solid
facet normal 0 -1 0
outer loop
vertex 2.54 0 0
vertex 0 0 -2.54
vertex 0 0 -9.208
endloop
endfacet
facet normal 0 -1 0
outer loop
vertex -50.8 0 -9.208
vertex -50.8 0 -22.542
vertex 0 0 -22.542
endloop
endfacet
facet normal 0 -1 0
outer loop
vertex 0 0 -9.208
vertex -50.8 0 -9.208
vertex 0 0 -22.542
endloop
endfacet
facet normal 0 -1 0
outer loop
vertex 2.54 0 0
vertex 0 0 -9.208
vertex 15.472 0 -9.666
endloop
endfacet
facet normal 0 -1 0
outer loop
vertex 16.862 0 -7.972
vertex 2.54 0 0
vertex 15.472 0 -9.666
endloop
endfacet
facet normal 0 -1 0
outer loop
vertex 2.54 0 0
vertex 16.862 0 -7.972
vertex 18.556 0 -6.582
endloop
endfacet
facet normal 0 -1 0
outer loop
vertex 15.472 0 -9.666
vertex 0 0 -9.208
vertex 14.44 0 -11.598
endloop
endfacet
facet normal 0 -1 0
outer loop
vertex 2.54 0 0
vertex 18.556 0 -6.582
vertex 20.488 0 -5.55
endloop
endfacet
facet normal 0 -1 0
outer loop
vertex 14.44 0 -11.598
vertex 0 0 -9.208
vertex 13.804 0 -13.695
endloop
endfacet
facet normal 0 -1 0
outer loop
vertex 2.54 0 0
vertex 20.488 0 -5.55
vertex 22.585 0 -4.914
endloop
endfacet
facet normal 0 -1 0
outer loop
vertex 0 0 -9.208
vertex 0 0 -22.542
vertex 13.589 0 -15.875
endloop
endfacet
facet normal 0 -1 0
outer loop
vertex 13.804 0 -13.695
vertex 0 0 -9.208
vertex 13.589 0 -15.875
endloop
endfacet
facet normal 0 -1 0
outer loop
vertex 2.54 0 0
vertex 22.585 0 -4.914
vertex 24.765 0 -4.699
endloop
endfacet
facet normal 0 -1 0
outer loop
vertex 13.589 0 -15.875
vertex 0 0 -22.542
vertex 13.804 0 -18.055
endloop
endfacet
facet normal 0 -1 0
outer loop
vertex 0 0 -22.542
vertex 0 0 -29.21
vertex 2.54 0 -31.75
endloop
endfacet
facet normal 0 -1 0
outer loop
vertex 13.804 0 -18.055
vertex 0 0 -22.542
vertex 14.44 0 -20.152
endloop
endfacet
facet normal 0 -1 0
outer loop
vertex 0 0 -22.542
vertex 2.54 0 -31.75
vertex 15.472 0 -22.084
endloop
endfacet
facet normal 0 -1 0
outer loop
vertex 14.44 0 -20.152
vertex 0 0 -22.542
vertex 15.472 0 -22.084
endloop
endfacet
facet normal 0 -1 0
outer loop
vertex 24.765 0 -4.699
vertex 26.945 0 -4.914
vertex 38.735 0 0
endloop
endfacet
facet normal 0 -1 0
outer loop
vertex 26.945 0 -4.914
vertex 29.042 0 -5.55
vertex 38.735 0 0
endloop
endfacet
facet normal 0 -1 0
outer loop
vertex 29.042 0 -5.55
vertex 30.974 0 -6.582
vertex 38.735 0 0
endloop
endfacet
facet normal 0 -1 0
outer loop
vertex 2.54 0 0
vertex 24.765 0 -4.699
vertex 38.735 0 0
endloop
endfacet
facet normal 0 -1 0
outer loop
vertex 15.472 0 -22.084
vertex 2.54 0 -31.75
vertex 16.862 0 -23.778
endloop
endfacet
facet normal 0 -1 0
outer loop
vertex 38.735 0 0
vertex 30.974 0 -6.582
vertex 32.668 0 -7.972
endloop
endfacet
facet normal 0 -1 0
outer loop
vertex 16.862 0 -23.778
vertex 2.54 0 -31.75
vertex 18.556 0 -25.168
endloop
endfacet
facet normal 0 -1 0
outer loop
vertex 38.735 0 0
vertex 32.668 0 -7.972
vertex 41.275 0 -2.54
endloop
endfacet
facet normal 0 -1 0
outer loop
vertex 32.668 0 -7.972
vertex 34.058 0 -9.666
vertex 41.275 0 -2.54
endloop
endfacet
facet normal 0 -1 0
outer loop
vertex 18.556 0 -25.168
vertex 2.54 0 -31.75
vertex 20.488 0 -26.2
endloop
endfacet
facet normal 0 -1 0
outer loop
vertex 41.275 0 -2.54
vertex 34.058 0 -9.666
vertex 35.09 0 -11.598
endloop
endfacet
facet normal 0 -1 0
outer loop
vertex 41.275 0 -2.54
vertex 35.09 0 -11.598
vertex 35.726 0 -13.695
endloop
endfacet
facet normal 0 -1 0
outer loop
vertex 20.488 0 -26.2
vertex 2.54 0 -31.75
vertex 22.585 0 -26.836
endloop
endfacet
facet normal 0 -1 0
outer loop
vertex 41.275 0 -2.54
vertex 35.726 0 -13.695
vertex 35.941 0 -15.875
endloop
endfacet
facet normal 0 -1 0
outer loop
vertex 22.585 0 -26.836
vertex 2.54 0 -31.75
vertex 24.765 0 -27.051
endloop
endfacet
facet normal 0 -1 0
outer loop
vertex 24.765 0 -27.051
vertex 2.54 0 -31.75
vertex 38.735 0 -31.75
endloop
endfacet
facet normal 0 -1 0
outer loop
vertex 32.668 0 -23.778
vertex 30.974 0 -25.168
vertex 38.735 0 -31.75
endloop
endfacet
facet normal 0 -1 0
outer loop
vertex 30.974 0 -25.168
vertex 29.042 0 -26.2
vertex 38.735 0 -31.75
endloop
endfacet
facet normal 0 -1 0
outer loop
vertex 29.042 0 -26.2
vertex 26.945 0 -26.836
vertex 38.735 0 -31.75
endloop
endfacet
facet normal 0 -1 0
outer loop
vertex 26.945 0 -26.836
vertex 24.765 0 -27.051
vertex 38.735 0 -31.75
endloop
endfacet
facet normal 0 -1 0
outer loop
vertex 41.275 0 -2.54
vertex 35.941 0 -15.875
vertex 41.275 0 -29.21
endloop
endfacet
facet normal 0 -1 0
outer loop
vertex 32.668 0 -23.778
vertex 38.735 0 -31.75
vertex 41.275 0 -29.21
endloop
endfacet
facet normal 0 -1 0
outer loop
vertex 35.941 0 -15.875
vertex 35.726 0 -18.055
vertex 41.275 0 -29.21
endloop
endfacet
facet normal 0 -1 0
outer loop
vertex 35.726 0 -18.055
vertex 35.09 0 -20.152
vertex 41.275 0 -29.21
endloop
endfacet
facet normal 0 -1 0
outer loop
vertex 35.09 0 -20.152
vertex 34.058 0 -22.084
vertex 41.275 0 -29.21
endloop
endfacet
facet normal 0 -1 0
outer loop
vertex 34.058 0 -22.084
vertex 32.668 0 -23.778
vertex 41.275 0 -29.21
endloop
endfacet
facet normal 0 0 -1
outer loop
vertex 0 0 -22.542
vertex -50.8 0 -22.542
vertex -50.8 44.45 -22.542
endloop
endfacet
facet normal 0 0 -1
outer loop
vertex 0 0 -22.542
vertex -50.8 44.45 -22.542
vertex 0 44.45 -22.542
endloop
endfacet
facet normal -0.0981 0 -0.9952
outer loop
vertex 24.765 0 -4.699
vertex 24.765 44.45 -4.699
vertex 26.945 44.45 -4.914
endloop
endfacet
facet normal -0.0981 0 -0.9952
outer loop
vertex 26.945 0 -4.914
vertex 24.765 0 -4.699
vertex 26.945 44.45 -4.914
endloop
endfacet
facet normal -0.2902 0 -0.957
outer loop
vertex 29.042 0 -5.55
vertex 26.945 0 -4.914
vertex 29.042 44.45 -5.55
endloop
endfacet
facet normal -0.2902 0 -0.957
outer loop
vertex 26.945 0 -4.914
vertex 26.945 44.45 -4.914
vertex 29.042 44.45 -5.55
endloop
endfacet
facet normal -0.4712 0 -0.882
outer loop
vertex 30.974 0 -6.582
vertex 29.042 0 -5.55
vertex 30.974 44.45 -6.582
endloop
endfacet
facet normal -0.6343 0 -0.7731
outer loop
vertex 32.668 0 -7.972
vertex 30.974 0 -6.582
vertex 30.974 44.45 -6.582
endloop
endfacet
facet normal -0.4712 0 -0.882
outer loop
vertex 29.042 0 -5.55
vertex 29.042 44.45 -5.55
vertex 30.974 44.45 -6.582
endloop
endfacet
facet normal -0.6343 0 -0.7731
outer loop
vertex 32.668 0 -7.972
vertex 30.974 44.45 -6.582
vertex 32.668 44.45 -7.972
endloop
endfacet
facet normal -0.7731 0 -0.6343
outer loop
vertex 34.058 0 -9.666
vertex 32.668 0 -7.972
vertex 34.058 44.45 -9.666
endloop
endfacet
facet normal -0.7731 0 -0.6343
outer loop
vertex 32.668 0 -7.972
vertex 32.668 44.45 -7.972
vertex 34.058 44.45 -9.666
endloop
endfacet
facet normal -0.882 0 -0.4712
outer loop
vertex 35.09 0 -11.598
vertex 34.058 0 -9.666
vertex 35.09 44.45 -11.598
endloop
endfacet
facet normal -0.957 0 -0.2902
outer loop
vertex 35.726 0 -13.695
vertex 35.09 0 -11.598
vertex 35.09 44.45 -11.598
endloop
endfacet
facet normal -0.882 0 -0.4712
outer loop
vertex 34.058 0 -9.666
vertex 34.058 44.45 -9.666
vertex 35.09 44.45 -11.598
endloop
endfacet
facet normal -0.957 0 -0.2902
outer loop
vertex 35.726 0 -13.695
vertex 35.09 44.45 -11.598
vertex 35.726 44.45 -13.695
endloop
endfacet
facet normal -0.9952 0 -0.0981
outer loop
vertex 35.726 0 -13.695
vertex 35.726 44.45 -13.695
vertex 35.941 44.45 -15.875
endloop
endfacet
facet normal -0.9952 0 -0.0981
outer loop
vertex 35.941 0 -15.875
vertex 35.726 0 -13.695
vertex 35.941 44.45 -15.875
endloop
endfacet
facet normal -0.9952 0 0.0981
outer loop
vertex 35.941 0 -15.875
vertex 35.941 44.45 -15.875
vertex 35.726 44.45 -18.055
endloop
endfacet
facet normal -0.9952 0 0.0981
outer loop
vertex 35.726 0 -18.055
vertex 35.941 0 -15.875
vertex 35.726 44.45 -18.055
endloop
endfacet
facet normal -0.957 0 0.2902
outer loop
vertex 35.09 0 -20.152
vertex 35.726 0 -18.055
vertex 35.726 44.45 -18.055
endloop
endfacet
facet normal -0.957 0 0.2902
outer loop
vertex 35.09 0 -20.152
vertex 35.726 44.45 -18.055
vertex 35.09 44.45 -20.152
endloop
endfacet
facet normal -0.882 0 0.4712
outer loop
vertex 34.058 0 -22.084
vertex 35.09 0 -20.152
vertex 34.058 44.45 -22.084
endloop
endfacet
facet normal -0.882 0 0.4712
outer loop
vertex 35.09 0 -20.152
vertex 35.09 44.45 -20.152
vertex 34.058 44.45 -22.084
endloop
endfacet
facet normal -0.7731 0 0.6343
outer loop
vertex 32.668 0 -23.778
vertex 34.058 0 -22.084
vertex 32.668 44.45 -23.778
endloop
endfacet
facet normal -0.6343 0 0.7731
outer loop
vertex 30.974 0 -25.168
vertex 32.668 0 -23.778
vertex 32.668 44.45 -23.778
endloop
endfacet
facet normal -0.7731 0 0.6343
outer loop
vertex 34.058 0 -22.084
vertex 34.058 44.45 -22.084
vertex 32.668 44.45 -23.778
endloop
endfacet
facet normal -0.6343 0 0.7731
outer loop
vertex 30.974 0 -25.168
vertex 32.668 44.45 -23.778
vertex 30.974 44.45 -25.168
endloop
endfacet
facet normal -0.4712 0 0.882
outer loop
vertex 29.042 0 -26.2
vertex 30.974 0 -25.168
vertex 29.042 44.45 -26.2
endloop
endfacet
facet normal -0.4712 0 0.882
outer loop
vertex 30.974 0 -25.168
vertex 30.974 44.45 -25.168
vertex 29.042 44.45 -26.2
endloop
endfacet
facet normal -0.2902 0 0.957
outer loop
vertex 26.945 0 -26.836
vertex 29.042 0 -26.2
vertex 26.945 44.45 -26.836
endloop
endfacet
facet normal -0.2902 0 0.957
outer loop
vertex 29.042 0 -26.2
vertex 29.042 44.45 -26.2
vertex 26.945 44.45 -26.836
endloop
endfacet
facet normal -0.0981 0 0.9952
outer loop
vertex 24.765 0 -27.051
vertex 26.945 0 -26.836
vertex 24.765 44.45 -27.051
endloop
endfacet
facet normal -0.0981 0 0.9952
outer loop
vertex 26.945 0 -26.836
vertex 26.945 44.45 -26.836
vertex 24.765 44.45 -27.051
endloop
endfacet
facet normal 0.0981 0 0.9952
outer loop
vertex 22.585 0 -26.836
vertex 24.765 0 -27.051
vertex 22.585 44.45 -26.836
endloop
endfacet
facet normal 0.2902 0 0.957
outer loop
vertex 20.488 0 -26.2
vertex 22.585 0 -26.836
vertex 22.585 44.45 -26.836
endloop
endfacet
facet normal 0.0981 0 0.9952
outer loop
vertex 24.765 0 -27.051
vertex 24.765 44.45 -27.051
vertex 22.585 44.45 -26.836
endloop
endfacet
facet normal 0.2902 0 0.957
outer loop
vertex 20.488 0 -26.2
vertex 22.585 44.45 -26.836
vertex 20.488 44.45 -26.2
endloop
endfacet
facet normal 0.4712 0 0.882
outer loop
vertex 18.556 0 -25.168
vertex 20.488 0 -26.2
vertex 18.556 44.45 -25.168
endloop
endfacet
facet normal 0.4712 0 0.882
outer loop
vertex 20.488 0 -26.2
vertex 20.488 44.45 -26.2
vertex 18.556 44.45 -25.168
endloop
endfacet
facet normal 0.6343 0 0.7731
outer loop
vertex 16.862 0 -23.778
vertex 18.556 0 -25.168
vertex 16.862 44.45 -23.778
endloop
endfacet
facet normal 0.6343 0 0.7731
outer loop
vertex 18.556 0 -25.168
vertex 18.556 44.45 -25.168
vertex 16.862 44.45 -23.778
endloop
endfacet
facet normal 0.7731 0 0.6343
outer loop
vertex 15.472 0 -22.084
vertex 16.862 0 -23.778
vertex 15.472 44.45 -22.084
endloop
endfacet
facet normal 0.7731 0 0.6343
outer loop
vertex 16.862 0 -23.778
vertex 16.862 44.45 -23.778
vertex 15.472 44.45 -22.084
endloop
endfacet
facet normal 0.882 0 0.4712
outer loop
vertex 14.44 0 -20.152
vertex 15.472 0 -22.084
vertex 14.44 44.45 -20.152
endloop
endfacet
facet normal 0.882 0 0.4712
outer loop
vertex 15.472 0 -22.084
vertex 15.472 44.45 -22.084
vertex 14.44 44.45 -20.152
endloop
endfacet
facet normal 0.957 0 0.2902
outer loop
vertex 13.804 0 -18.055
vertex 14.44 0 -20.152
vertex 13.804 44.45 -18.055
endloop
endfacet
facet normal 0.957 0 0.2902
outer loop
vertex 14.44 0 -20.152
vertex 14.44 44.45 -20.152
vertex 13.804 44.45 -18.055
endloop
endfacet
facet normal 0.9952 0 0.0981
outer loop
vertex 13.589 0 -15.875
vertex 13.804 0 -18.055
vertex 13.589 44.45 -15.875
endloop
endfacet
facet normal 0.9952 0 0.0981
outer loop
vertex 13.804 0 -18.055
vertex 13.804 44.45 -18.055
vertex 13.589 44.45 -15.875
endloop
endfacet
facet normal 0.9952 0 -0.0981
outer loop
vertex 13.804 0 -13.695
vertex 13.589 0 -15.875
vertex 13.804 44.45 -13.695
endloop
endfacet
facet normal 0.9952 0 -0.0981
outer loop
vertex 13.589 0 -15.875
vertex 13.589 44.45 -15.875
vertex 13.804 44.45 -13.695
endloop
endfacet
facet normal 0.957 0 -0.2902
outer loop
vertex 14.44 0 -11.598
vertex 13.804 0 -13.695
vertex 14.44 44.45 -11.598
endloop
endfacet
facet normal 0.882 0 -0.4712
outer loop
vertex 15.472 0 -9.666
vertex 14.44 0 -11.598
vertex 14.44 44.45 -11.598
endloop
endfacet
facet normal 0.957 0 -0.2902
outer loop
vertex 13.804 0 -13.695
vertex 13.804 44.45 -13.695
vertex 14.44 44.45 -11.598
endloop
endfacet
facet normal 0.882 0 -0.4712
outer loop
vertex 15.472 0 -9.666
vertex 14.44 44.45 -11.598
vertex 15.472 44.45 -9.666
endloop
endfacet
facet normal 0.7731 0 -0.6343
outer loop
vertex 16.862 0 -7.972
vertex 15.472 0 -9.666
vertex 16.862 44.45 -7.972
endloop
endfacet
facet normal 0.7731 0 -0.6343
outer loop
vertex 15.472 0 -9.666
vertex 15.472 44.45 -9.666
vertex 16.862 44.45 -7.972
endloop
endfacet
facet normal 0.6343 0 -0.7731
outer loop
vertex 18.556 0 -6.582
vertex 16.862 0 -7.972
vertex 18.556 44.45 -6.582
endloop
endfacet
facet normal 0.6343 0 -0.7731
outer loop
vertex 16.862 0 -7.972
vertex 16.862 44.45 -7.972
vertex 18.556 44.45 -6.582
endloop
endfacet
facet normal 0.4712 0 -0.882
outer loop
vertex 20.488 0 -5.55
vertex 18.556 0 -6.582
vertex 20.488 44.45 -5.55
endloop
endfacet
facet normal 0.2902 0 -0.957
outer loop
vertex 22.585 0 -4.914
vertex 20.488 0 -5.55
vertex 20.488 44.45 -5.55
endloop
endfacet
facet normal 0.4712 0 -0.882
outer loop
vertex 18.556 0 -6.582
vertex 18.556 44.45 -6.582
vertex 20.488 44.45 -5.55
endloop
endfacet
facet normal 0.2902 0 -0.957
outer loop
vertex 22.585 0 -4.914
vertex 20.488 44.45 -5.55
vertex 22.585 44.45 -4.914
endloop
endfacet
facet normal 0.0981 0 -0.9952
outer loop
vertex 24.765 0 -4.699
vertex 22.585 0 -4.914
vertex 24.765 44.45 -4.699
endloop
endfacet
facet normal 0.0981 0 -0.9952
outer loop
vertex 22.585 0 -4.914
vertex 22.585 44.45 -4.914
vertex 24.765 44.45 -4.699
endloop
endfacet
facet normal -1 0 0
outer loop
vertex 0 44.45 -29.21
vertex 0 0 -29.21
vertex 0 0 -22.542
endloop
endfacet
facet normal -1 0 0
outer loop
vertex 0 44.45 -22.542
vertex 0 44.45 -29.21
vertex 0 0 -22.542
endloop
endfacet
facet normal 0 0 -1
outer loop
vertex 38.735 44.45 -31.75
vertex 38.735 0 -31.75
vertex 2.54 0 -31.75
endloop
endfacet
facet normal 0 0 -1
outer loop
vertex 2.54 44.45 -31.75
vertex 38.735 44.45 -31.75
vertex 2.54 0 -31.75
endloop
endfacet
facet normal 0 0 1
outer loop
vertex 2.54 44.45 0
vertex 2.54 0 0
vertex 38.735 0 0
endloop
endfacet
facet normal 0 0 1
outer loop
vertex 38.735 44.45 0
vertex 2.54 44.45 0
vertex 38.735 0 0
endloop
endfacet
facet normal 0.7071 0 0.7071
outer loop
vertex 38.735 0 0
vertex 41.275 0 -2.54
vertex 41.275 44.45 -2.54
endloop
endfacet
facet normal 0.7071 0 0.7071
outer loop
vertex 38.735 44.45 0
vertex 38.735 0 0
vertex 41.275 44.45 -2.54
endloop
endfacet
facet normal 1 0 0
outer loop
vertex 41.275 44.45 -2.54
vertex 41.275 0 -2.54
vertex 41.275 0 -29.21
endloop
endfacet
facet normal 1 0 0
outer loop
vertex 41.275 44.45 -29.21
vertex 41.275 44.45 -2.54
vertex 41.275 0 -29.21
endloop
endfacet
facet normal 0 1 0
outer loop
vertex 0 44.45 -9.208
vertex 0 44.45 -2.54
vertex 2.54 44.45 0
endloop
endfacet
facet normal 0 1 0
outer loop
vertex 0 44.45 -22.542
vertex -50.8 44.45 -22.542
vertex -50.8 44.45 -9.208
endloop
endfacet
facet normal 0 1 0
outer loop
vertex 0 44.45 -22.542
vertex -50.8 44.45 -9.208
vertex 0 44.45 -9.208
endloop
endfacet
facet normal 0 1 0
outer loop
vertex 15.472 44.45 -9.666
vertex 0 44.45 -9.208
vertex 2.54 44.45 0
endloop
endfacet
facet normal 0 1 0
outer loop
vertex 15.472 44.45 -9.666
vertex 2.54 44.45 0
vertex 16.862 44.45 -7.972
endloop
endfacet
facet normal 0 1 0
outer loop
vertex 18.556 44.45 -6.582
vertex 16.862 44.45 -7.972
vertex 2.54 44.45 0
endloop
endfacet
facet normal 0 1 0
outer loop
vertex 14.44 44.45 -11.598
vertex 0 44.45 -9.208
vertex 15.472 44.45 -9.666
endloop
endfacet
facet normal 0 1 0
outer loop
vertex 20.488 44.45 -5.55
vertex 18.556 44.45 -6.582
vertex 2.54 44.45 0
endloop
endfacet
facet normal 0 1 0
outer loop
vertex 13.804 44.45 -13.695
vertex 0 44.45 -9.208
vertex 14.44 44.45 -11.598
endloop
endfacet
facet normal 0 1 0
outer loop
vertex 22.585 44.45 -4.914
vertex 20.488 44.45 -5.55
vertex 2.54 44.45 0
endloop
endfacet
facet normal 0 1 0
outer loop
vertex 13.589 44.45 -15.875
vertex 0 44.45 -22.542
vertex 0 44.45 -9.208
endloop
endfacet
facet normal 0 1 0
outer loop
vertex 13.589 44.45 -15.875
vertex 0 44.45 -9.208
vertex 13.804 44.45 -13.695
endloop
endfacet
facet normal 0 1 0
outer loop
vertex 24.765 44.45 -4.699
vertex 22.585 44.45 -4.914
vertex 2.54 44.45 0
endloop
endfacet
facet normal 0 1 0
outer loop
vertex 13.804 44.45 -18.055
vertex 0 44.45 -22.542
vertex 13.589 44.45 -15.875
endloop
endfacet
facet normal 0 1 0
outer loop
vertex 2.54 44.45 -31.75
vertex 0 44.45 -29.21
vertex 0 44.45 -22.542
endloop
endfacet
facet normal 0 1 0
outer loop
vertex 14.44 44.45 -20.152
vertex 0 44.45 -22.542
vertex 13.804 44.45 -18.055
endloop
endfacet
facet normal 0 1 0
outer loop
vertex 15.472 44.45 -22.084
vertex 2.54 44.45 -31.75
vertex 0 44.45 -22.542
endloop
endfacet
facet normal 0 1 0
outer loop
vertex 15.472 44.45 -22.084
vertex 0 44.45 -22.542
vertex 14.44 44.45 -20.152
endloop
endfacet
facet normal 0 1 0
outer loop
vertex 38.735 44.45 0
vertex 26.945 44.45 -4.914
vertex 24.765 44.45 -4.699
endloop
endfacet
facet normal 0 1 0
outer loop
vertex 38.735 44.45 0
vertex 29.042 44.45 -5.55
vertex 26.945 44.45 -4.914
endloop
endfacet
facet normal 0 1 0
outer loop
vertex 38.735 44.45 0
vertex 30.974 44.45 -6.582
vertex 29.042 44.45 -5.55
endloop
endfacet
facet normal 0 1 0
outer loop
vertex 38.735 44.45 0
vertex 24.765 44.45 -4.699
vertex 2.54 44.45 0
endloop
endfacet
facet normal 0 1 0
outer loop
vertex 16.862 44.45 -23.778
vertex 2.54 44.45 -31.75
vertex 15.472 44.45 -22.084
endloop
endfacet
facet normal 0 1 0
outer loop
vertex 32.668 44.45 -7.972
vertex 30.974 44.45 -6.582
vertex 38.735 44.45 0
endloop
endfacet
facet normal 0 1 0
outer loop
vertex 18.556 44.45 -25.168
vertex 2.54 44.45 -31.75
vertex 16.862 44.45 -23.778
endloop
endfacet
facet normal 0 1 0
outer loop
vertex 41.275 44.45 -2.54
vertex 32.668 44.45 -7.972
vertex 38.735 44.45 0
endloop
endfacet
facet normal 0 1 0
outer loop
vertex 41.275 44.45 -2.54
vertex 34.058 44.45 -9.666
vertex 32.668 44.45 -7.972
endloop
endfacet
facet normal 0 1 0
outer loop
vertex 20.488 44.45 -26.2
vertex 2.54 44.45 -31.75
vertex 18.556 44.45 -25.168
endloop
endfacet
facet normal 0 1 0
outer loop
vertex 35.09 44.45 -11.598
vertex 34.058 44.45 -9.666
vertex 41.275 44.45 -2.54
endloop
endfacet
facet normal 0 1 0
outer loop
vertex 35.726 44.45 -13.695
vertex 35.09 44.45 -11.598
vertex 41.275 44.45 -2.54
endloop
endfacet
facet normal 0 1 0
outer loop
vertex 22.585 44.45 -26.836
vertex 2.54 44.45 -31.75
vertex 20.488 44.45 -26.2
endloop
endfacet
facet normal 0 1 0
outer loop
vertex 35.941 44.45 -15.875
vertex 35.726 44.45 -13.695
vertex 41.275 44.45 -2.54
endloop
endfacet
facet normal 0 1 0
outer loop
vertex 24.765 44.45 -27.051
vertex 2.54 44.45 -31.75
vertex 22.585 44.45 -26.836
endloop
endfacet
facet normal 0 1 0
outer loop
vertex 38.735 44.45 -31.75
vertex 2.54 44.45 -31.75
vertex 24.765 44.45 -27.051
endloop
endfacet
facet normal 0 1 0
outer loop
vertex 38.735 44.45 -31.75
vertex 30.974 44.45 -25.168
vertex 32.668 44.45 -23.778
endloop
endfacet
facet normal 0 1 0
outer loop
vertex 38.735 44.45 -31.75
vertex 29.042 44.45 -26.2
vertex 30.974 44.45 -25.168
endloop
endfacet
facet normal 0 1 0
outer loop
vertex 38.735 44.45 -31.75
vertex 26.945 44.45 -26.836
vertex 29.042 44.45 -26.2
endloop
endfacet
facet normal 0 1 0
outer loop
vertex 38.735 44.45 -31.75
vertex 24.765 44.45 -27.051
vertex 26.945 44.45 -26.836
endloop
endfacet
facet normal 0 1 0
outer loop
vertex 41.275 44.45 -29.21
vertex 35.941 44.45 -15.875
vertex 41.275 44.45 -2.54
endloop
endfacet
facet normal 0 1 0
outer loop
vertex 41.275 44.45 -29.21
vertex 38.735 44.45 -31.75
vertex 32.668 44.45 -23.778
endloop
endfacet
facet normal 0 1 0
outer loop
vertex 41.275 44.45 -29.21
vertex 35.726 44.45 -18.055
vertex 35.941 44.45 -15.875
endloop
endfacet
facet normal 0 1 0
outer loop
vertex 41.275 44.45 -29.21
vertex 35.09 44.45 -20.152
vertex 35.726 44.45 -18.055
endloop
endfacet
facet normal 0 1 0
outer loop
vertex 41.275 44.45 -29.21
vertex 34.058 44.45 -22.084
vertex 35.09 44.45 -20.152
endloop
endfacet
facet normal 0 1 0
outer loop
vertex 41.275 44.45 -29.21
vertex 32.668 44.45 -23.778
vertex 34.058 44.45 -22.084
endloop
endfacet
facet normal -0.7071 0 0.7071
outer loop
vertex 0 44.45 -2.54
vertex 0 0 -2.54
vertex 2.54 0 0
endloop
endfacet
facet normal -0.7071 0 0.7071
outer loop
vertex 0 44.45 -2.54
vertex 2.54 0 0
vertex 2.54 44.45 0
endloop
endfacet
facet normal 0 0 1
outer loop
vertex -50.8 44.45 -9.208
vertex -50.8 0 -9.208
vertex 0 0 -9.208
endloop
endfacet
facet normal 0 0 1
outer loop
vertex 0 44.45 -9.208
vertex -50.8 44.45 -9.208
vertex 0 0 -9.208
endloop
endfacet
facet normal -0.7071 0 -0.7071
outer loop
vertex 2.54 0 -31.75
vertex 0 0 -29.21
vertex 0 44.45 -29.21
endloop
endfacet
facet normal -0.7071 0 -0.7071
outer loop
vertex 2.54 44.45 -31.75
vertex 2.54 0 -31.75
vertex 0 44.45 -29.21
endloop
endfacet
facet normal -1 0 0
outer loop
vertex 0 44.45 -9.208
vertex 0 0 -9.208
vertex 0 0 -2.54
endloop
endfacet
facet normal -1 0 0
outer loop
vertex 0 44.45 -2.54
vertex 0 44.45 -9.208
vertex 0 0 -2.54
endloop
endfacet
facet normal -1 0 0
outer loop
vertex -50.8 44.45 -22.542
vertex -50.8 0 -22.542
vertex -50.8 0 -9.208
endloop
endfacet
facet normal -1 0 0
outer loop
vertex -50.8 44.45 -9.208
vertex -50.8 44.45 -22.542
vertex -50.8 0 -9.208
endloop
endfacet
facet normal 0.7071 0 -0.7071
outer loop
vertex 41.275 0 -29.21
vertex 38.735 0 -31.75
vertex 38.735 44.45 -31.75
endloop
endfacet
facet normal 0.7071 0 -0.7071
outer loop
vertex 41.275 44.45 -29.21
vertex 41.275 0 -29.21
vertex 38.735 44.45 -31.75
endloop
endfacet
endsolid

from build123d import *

# Parameters (mm, degrees)
SKETCH1_W           = 50.8
SKETCH1_H           = 6.6675
BOSS_EXTRUDE1_DEPTH = 44.45
CHAMFER1_SIZE       = 2.54
CHAMFER2_SIZE       = 2.54
SKETCH2_R           = 11.176
CUT_EXTRUDE1_DEPTH  = 44.45


with BuildPart() as part:
    # Sketch1 → Boss-Extrude1 (new body)
    with BuildSketch(Plane(origin=(0, 0, 0), x_dir=(1, 0, 0), z_dir=(0, 1, 0))):
        Polygon((0, 22.5425), (0, 15.875), (0, 9.2075), (0, 0), (41.275, 0), (41.275, 31.75), (0, 31.75), align=None)
        with Locations((-25.4, 19.20875)):
            Rectangle(SKETCH1_W, SKETCH1_H)
        with Locations((-25.4, 12.54125)):
            Rectangle(SKETCH1_W, SKETCH1_H)
    extrude(amount=BOSS_EXTRUDE1_DEPTH)

    # Chamfer1
    chamfer1_edges = [part.edges().sort_by_distance(p)[0] for p in [
        (0, 22.225, 0),
        (41.275, 22.225, -31.75),
        (41.275, 22.225, 0),
    ]]
    chamfer(chamfer1_edges, length=CHAMFER1_SIZE)

    # Chamfer2
    chamfer2_edges = [part.edges().sort_by_distance(p)[0] for p in [
        (0, 22.225, -31.75),
    ]]
    chamfer(chamfer2_edges, length=CHAMFER2_SIZE)

    # Sketch2 → Cut-Extrude1 (cut)
    with BuildSketch(Plane(origin=(0, 44.45, 0), x_dir=(1, 0, 0), z_dir=(0, 1, 0))):
        with Locations(Location((24.765, 15.875, 0), (0, 0, 270))):
            Circle(SKETCH2_R)
    extrude(amount=-CUT_EXTRUDE1_DEPTH, mode=Mode.SUBTRACT)


solid = part.part
